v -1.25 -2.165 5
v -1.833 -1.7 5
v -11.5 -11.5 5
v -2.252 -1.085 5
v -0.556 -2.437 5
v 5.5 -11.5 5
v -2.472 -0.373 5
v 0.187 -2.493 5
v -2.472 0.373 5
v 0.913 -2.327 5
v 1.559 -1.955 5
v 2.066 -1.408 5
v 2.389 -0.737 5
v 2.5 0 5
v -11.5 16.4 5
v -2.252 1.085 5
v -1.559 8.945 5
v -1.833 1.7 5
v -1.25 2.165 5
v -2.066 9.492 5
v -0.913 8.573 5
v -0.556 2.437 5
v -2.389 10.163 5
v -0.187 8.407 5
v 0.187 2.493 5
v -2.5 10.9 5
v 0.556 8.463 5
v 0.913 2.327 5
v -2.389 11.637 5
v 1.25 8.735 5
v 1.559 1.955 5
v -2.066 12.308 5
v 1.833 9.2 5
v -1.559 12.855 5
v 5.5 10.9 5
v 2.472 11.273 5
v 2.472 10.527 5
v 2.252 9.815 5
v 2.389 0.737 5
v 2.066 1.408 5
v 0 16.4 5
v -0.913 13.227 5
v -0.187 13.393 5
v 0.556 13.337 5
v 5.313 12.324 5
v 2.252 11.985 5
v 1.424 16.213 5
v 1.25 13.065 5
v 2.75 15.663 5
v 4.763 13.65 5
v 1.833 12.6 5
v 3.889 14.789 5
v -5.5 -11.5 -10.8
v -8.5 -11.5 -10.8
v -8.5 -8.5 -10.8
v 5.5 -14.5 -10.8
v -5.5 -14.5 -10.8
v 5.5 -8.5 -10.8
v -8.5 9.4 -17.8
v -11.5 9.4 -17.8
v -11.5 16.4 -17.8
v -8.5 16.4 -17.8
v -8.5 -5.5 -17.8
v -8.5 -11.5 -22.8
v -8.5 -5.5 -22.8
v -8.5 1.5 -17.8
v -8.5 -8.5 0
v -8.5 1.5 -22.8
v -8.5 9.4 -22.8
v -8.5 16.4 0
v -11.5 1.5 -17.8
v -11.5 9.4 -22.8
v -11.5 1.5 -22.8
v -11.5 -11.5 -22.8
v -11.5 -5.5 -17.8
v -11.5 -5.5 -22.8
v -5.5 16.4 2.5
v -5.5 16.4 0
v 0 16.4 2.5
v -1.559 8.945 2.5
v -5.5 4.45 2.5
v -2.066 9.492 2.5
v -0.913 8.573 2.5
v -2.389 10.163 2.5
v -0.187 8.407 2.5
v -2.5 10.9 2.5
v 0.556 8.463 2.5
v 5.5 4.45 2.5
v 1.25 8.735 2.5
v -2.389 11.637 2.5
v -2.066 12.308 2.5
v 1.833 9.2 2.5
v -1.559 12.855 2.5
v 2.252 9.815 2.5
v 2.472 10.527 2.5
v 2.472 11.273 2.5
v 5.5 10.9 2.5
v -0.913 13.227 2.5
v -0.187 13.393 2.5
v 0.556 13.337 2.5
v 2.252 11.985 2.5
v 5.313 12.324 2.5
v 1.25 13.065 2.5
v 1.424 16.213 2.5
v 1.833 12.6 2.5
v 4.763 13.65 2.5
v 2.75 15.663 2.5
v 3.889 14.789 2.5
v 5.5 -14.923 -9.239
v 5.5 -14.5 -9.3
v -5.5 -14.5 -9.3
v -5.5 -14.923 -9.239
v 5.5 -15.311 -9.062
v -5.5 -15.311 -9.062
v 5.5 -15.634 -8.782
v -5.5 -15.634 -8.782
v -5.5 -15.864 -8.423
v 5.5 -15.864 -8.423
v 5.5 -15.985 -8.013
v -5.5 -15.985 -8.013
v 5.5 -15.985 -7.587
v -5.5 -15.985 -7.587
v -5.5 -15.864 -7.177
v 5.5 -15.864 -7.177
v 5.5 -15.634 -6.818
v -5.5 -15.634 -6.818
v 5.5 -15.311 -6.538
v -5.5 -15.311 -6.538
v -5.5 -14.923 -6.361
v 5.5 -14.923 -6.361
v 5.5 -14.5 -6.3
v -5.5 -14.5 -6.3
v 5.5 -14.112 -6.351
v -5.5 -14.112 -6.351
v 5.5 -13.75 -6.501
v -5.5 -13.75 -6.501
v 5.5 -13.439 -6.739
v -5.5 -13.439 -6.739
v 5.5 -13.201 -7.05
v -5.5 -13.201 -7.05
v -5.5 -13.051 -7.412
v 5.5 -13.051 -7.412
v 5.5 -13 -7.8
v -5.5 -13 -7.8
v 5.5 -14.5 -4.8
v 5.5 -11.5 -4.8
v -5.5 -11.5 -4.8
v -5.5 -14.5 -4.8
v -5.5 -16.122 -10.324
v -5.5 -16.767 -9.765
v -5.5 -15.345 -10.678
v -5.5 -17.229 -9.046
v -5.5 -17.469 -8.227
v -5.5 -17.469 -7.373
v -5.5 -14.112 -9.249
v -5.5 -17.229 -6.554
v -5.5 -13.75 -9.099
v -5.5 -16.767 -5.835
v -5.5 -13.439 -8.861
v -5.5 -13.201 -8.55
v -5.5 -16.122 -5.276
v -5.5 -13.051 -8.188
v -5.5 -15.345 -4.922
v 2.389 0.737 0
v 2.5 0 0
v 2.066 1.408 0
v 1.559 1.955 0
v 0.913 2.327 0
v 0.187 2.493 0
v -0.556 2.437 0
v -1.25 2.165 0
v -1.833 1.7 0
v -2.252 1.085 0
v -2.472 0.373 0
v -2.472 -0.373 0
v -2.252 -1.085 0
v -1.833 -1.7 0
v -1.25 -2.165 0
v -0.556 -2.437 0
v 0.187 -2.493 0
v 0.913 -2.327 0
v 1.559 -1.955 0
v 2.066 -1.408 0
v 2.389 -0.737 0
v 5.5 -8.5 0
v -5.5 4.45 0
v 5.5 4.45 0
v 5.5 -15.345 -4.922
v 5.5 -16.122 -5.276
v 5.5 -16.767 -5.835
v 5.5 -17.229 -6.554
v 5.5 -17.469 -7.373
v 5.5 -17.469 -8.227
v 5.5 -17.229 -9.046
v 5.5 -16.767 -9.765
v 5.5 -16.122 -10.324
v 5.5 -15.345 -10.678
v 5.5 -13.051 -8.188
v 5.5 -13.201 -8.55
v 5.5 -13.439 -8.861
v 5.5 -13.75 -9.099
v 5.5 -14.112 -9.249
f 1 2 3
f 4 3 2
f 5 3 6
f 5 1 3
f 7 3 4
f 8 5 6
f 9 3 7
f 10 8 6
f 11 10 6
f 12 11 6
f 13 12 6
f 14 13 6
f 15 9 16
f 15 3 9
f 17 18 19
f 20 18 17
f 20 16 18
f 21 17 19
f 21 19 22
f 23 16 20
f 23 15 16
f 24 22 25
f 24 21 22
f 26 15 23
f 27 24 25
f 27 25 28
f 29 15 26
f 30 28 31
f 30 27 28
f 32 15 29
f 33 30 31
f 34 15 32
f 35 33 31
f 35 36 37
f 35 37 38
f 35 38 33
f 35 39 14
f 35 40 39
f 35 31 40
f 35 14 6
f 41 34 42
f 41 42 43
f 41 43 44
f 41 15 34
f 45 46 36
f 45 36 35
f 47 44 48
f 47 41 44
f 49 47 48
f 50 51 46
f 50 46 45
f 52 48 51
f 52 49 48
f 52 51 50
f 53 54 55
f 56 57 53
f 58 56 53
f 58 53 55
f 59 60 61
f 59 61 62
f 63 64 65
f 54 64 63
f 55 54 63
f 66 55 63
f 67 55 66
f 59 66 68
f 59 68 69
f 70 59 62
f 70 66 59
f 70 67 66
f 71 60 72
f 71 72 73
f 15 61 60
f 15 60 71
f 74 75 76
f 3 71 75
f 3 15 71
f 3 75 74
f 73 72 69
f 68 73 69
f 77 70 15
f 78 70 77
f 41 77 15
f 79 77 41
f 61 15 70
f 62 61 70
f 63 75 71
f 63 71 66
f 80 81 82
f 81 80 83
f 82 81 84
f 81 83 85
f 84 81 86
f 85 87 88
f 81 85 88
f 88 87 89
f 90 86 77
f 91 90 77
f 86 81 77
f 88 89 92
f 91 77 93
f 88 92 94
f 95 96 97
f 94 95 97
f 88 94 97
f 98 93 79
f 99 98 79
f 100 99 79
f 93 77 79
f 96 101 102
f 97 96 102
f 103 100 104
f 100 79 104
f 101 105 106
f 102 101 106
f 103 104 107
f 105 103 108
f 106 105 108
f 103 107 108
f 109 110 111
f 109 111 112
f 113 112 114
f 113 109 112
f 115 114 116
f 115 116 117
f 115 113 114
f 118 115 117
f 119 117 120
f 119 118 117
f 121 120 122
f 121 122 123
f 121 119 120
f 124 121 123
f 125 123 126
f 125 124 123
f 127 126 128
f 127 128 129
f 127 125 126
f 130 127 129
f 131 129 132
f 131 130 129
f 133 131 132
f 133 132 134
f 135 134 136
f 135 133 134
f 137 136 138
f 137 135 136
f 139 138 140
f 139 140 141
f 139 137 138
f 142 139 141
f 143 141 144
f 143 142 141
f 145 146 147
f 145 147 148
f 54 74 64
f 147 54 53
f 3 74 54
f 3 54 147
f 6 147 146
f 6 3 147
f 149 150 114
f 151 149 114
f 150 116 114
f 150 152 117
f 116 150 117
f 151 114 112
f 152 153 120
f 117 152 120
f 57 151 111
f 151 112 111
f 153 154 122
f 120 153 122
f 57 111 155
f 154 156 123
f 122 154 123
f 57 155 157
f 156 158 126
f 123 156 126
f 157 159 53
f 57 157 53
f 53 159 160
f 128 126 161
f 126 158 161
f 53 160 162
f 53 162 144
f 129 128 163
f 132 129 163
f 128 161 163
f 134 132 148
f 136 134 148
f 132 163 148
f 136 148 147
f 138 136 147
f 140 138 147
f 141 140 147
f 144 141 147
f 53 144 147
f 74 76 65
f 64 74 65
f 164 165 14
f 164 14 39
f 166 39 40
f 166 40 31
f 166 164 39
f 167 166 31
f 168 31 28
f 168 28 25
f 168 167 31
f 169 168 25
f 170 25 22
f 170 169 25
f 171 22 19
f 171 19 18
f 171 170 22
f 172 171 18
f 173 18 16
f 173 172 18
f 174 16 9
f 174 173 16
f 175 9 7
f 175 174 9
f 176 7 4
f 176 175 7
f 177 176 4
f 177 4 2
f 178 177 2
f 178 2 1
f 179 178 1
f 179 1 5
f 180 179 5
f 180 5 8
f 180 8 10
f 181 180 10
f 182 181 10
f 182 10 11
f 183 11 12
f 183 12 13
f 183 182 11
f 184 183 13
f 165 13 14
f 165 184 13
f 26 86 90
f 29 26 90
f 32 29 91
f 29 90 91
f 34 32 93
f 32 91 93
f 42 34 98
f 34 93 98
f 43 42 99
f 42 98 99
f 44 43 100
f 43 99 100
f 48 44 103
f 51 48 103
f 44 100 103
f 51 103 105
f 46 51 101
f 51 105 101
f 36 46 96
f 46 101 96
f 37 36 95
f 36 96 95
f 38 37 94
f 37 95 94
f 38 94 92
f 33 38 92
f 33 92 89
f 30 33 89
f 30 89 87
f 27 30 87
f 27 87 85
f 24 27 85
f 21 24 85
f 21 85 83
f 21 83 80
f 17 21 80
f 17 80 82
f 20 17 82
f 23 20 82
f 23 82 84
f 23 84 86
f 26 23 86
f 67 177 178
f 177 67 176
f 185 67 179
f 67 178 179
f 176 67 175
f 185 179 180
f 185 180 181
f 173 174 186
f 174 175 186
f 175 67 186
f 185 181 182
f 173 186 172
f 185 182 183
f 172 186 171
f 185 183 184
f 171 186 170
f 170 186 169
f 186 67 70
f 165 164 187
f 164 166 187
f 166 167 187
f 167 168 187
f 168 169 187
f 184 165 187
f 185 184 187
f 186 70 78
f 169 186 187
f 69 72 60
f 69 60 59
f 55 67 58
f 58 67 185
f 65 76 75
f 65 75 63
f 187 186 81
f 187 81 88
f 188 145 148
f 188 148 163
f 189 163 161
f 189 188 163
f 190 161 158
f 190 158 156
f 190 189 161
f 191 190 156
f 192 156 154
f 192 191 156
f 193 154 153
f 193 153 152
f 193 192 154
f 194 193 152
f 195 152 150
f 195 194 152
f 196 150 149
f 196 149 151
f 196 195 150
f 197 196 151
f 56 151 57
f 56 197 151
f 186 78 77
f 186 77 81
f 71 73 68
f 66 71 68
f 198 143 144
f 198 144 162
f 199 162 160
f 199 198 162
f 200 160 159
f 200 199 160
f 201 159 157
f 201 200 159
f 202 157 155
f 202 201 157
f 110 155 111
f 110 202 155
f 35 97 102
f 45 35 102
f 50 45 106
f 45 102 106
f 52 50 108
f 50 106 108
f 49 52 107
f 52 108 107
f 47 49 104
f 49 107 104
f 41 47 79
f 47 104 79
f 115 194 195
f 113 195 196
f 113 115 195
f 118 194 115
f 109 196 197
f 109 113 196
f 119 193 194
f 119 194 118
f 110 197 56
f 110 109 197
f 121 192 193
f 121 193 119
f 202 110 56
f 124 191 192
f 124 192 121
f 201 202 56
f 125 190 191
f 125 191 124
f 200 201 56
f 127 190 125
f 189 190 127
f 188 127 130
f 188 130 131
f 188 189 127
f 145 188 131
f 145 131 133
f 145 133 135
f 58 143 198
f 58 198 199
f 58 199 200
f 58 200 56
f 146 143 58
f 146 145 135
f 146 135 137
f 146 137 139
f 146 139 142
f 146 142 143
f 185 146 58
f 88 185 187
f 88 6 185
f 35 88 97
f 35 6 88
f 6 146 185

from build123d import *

# Parameters (mm, degrees)
F0_R          = 2.5
F0_W          = 3
F0_H          = 3
F0_W_2        = 14
F1_DEPTH      = 5
F2_DEPTH      = 2.5
F0_H_2        = 21.9
F3_DEPTH      = 22.8
F3_DEPTH_BACK = 5
F4_W          = 3
F4_H          = 7
F5_DEPTH      = 5
F6_DEPTH      = 10.8
F8_DEPTH      = 11


with BuildPart() as f1:
    # F0 (on Top) → F1 (new body)
    with BuildSketch(Plane.XY):
        with BuildLine():
            Line((-5.5, 4.45), (-5.5, 0))
            ThreePointArc((-5.5, 0), (-3.8890872965, -3.8890872965), (0, -5.5))
            ThreePointArc((0, -5.5), (3.8890872965, -3.8890872965), (5.5, 0))
            Line((5.5, 0), (5.5, 4.45))
            Line((5.5, 4.45), (-5.5, 4.45))
        make_face()
        Circle(F0_R, mode=Mode.SUBTRACT)
        with BuildLine():
            Line((-5.5, 5.45), (-5.5, 4.45))
            Line((-5.5, 4.45), (5.5, 4.45))
            Line((5.5, 4.45), (5.5, 10.9))
            ThreePointArc((5.5, 10.9), (3.8890872965, 14.7890872965), (0, 16.4))
            ThreePointArc((0, 16.4), (-3.8890872965, 14.7890872965), (-5.5, 10.9))
            Line((-5.5, 10.9), (-5.5, 5.45))
        make_face()
        with BuildLine():
            ThreePointArc((2.5, 10.9), (0, 8.4), (-2.5, 10.9))
            ThreePointArc((-2.5, 10.9), (0, 13.4), (2.5, 10.9))
        make_face(mode=Mode.SUBTRACT)
        with BuildLine():
            ThreePointArc((0, -5.5), (-3.8890872965, -3.8890872965), (-5.5, 0))
            Line((-5.5, 0), (-5.5, 4.45))
            Line((-5.5, 4.45), (-5.5, 5.45))
            Line((-5.5, 5.45), (-5.5, 10.9))
            Line((-5.5, 10.9), (-5.5, 16.4))
            Line((-5.5, 16.4), (-8.5, 16.4))
            Line((-8.5, 16.4), (-8.5, -5.5))
            Line((-8.5, -5.5), (0, -5.5))
        make_face()
        with BuildLine():
            Line((-5.5, 16.4), (-5.5, 10.9))
            ThreePointArc((-5.5, 10.9), (-3.8890872965, 14.7890872965), (0, 16.4))
            Line((0, 16.4), (-5.5, 16.4))
        make_face()
        with BuildLine():
            ThreePointArc((5.5, 0), (3.8890872965, -3.8890872965), (0, -5.5))
            Line((0, -5.5), (-8.5, -5.5))
            Line((-8.5, -5.5), (-8.5, -8.5))
            Line((-8.5, -8.5), (5.5, -8.5))
            Line((5.5, -8.5), (5.5, 0))
        make_face()
        with Locations((-10, -10)):
            Rectangle(F0_W, F0_H)
        with Locations((-1.5, -10)):
            Rectangle(F0_W_2, F0_H)
    extrude(amount=F1_DEPTH)

    # F0 (on Top) → F2 (cut)
    with BuildSketch(Plane.XY):
        with BuildLine():
            Line((-5.5, 5.45), (-5.5, 4.45))
            Line((-5.5, 4.45), (5.5, 4.45))
            Line((5.5, 4.45), (5.5, 10.9))
            ThreePointArc((5.5, 10.9), (3.8890872965, 14.7890872965), (0, 16.4))
            ThreePointArc((0, 16.4), (-3.8890872965, 14.7890872965), (-5.5, 10.9))
            Line((-5.5, 10.9), (-5.5, 5.45))
        make_face()
        with BuildLine():
            ThreePointArc((2.5, 10.9), (0, 8.4), (-2.5, 10.9))
            ThreePointArc((-2.5, 10.9), (0, 13.4), (2.5, 10.9))
        make_face(mode=Mode.SUBTRACT)
        with BuildLine():
            Line((-5.5, 16.4), (-5.5, 10.9))
            ThreePointArc((-5.5, 10.9), (-3.8890872965, 14.7890872965), (0, 16.4))
            Line((0, 16.4), (-5.5, 16.4))
        make_face()
    extrude(amount=F2_DEPTH, mode=Mode.SUBTRACT)

    # F0 (on Top) → F3 (join, two sides)
    with BuildSketch(Plane.XY) as f3_sk:
        with Locations((-10, -10)):
            Rectangle(F0_W, F0_H)
        with Locations((-10, 5.45)):
            Rectangle(F0_W, F0_H_2)
        with Locations((-10, -7)):
            Rectangle(F0_W, F0_H)
    extrude(amount=-F3_DEPTH)
    extrude(f3_sk.sketch, amount=F3_DEPTH_BACK)

    # F4 (on face) → F5 (cut)
    with BuildSketch(Plane(origin=(0, 0, -22.8), x_dir=(1, 0, 0), z_dir=(0, 0, -1))):
        with Locations((-10, -12.9)):
            Rectangle(F4_W, F4_H)
        with Locations((-10, 2)):
            Rectangle(F4_W, F4_H)
    extrude(amount=-F5_DEPTH, mode=Mode.SUBTRACT)

    # F0 (on Top) → F6 (join)
    with BuildSketch(Plane.XY):
        with Locations((-1.5, -10)):
            Rectangle(F0_W_2, F0_H)
    extrude(amount=-F6_DEPTH)

    # F7 (on face) → F8 (join)
    with BuildSketch(Plane.YZ.offset(5.5)):
        with BuildLine():
            ThreePointArc((-14.5, -4.8), (-17.5, -7.8), (-14.5, -10.8))
            Line((-14.5, -10.8), (-14.5, -9.3))
            ThreePointArc((-14.5, -9.3), (-16, -7.8), (-14.5, -6.3))
            Line((-14.5, -6.3), (-14.5, -4.8))
        make_face()
        with BuildLine():
            Line((-14.5, -9.3), (-14.5, -10.8))
            ThreePointArc((-14.5, -10.8), (-12.3786796564, -9.9213203436), (-11.5, -7.8))
            ThreePointArc((-11.5, -7.8), (-12.3786796564, -5.6786796564), (-14.5, -4.8))
            Line((-14.5, -4.8), (-14.5, -6.3))
            ThreePointArc((-14.5, -6.3), (-13.4393398282, -6.7393398282), (-13, -7.8))
            ThreePointArc((-13, -7.8), (-13.4393398282, -8.8606601718), (-14.5, -9.3))
        make_face()
        with BuildLine():
            ThreePointArc((-14.5, -4.8), (-12.3786796564, -5.6786796564), (-11.5, -7.8))
            Line((-11.5, -7.8), (-11.5, -4.8))
            Line((-11.5, -4.8), (-14.5, -4.8))
        make_face()
        with BuildLine():
            Line((-14.5, -10.8), (-11.5, -10.8))
            Line((-11.5, -10.8), (-11.5, -7.8))
            ThreePointArc((-11.5, -7.8), (-12.3786796564, -9.9213203436), (-14.5, -10.8))
        make_face()
    extrude(amount=-F8_DEPTH)


solid = f1.part
